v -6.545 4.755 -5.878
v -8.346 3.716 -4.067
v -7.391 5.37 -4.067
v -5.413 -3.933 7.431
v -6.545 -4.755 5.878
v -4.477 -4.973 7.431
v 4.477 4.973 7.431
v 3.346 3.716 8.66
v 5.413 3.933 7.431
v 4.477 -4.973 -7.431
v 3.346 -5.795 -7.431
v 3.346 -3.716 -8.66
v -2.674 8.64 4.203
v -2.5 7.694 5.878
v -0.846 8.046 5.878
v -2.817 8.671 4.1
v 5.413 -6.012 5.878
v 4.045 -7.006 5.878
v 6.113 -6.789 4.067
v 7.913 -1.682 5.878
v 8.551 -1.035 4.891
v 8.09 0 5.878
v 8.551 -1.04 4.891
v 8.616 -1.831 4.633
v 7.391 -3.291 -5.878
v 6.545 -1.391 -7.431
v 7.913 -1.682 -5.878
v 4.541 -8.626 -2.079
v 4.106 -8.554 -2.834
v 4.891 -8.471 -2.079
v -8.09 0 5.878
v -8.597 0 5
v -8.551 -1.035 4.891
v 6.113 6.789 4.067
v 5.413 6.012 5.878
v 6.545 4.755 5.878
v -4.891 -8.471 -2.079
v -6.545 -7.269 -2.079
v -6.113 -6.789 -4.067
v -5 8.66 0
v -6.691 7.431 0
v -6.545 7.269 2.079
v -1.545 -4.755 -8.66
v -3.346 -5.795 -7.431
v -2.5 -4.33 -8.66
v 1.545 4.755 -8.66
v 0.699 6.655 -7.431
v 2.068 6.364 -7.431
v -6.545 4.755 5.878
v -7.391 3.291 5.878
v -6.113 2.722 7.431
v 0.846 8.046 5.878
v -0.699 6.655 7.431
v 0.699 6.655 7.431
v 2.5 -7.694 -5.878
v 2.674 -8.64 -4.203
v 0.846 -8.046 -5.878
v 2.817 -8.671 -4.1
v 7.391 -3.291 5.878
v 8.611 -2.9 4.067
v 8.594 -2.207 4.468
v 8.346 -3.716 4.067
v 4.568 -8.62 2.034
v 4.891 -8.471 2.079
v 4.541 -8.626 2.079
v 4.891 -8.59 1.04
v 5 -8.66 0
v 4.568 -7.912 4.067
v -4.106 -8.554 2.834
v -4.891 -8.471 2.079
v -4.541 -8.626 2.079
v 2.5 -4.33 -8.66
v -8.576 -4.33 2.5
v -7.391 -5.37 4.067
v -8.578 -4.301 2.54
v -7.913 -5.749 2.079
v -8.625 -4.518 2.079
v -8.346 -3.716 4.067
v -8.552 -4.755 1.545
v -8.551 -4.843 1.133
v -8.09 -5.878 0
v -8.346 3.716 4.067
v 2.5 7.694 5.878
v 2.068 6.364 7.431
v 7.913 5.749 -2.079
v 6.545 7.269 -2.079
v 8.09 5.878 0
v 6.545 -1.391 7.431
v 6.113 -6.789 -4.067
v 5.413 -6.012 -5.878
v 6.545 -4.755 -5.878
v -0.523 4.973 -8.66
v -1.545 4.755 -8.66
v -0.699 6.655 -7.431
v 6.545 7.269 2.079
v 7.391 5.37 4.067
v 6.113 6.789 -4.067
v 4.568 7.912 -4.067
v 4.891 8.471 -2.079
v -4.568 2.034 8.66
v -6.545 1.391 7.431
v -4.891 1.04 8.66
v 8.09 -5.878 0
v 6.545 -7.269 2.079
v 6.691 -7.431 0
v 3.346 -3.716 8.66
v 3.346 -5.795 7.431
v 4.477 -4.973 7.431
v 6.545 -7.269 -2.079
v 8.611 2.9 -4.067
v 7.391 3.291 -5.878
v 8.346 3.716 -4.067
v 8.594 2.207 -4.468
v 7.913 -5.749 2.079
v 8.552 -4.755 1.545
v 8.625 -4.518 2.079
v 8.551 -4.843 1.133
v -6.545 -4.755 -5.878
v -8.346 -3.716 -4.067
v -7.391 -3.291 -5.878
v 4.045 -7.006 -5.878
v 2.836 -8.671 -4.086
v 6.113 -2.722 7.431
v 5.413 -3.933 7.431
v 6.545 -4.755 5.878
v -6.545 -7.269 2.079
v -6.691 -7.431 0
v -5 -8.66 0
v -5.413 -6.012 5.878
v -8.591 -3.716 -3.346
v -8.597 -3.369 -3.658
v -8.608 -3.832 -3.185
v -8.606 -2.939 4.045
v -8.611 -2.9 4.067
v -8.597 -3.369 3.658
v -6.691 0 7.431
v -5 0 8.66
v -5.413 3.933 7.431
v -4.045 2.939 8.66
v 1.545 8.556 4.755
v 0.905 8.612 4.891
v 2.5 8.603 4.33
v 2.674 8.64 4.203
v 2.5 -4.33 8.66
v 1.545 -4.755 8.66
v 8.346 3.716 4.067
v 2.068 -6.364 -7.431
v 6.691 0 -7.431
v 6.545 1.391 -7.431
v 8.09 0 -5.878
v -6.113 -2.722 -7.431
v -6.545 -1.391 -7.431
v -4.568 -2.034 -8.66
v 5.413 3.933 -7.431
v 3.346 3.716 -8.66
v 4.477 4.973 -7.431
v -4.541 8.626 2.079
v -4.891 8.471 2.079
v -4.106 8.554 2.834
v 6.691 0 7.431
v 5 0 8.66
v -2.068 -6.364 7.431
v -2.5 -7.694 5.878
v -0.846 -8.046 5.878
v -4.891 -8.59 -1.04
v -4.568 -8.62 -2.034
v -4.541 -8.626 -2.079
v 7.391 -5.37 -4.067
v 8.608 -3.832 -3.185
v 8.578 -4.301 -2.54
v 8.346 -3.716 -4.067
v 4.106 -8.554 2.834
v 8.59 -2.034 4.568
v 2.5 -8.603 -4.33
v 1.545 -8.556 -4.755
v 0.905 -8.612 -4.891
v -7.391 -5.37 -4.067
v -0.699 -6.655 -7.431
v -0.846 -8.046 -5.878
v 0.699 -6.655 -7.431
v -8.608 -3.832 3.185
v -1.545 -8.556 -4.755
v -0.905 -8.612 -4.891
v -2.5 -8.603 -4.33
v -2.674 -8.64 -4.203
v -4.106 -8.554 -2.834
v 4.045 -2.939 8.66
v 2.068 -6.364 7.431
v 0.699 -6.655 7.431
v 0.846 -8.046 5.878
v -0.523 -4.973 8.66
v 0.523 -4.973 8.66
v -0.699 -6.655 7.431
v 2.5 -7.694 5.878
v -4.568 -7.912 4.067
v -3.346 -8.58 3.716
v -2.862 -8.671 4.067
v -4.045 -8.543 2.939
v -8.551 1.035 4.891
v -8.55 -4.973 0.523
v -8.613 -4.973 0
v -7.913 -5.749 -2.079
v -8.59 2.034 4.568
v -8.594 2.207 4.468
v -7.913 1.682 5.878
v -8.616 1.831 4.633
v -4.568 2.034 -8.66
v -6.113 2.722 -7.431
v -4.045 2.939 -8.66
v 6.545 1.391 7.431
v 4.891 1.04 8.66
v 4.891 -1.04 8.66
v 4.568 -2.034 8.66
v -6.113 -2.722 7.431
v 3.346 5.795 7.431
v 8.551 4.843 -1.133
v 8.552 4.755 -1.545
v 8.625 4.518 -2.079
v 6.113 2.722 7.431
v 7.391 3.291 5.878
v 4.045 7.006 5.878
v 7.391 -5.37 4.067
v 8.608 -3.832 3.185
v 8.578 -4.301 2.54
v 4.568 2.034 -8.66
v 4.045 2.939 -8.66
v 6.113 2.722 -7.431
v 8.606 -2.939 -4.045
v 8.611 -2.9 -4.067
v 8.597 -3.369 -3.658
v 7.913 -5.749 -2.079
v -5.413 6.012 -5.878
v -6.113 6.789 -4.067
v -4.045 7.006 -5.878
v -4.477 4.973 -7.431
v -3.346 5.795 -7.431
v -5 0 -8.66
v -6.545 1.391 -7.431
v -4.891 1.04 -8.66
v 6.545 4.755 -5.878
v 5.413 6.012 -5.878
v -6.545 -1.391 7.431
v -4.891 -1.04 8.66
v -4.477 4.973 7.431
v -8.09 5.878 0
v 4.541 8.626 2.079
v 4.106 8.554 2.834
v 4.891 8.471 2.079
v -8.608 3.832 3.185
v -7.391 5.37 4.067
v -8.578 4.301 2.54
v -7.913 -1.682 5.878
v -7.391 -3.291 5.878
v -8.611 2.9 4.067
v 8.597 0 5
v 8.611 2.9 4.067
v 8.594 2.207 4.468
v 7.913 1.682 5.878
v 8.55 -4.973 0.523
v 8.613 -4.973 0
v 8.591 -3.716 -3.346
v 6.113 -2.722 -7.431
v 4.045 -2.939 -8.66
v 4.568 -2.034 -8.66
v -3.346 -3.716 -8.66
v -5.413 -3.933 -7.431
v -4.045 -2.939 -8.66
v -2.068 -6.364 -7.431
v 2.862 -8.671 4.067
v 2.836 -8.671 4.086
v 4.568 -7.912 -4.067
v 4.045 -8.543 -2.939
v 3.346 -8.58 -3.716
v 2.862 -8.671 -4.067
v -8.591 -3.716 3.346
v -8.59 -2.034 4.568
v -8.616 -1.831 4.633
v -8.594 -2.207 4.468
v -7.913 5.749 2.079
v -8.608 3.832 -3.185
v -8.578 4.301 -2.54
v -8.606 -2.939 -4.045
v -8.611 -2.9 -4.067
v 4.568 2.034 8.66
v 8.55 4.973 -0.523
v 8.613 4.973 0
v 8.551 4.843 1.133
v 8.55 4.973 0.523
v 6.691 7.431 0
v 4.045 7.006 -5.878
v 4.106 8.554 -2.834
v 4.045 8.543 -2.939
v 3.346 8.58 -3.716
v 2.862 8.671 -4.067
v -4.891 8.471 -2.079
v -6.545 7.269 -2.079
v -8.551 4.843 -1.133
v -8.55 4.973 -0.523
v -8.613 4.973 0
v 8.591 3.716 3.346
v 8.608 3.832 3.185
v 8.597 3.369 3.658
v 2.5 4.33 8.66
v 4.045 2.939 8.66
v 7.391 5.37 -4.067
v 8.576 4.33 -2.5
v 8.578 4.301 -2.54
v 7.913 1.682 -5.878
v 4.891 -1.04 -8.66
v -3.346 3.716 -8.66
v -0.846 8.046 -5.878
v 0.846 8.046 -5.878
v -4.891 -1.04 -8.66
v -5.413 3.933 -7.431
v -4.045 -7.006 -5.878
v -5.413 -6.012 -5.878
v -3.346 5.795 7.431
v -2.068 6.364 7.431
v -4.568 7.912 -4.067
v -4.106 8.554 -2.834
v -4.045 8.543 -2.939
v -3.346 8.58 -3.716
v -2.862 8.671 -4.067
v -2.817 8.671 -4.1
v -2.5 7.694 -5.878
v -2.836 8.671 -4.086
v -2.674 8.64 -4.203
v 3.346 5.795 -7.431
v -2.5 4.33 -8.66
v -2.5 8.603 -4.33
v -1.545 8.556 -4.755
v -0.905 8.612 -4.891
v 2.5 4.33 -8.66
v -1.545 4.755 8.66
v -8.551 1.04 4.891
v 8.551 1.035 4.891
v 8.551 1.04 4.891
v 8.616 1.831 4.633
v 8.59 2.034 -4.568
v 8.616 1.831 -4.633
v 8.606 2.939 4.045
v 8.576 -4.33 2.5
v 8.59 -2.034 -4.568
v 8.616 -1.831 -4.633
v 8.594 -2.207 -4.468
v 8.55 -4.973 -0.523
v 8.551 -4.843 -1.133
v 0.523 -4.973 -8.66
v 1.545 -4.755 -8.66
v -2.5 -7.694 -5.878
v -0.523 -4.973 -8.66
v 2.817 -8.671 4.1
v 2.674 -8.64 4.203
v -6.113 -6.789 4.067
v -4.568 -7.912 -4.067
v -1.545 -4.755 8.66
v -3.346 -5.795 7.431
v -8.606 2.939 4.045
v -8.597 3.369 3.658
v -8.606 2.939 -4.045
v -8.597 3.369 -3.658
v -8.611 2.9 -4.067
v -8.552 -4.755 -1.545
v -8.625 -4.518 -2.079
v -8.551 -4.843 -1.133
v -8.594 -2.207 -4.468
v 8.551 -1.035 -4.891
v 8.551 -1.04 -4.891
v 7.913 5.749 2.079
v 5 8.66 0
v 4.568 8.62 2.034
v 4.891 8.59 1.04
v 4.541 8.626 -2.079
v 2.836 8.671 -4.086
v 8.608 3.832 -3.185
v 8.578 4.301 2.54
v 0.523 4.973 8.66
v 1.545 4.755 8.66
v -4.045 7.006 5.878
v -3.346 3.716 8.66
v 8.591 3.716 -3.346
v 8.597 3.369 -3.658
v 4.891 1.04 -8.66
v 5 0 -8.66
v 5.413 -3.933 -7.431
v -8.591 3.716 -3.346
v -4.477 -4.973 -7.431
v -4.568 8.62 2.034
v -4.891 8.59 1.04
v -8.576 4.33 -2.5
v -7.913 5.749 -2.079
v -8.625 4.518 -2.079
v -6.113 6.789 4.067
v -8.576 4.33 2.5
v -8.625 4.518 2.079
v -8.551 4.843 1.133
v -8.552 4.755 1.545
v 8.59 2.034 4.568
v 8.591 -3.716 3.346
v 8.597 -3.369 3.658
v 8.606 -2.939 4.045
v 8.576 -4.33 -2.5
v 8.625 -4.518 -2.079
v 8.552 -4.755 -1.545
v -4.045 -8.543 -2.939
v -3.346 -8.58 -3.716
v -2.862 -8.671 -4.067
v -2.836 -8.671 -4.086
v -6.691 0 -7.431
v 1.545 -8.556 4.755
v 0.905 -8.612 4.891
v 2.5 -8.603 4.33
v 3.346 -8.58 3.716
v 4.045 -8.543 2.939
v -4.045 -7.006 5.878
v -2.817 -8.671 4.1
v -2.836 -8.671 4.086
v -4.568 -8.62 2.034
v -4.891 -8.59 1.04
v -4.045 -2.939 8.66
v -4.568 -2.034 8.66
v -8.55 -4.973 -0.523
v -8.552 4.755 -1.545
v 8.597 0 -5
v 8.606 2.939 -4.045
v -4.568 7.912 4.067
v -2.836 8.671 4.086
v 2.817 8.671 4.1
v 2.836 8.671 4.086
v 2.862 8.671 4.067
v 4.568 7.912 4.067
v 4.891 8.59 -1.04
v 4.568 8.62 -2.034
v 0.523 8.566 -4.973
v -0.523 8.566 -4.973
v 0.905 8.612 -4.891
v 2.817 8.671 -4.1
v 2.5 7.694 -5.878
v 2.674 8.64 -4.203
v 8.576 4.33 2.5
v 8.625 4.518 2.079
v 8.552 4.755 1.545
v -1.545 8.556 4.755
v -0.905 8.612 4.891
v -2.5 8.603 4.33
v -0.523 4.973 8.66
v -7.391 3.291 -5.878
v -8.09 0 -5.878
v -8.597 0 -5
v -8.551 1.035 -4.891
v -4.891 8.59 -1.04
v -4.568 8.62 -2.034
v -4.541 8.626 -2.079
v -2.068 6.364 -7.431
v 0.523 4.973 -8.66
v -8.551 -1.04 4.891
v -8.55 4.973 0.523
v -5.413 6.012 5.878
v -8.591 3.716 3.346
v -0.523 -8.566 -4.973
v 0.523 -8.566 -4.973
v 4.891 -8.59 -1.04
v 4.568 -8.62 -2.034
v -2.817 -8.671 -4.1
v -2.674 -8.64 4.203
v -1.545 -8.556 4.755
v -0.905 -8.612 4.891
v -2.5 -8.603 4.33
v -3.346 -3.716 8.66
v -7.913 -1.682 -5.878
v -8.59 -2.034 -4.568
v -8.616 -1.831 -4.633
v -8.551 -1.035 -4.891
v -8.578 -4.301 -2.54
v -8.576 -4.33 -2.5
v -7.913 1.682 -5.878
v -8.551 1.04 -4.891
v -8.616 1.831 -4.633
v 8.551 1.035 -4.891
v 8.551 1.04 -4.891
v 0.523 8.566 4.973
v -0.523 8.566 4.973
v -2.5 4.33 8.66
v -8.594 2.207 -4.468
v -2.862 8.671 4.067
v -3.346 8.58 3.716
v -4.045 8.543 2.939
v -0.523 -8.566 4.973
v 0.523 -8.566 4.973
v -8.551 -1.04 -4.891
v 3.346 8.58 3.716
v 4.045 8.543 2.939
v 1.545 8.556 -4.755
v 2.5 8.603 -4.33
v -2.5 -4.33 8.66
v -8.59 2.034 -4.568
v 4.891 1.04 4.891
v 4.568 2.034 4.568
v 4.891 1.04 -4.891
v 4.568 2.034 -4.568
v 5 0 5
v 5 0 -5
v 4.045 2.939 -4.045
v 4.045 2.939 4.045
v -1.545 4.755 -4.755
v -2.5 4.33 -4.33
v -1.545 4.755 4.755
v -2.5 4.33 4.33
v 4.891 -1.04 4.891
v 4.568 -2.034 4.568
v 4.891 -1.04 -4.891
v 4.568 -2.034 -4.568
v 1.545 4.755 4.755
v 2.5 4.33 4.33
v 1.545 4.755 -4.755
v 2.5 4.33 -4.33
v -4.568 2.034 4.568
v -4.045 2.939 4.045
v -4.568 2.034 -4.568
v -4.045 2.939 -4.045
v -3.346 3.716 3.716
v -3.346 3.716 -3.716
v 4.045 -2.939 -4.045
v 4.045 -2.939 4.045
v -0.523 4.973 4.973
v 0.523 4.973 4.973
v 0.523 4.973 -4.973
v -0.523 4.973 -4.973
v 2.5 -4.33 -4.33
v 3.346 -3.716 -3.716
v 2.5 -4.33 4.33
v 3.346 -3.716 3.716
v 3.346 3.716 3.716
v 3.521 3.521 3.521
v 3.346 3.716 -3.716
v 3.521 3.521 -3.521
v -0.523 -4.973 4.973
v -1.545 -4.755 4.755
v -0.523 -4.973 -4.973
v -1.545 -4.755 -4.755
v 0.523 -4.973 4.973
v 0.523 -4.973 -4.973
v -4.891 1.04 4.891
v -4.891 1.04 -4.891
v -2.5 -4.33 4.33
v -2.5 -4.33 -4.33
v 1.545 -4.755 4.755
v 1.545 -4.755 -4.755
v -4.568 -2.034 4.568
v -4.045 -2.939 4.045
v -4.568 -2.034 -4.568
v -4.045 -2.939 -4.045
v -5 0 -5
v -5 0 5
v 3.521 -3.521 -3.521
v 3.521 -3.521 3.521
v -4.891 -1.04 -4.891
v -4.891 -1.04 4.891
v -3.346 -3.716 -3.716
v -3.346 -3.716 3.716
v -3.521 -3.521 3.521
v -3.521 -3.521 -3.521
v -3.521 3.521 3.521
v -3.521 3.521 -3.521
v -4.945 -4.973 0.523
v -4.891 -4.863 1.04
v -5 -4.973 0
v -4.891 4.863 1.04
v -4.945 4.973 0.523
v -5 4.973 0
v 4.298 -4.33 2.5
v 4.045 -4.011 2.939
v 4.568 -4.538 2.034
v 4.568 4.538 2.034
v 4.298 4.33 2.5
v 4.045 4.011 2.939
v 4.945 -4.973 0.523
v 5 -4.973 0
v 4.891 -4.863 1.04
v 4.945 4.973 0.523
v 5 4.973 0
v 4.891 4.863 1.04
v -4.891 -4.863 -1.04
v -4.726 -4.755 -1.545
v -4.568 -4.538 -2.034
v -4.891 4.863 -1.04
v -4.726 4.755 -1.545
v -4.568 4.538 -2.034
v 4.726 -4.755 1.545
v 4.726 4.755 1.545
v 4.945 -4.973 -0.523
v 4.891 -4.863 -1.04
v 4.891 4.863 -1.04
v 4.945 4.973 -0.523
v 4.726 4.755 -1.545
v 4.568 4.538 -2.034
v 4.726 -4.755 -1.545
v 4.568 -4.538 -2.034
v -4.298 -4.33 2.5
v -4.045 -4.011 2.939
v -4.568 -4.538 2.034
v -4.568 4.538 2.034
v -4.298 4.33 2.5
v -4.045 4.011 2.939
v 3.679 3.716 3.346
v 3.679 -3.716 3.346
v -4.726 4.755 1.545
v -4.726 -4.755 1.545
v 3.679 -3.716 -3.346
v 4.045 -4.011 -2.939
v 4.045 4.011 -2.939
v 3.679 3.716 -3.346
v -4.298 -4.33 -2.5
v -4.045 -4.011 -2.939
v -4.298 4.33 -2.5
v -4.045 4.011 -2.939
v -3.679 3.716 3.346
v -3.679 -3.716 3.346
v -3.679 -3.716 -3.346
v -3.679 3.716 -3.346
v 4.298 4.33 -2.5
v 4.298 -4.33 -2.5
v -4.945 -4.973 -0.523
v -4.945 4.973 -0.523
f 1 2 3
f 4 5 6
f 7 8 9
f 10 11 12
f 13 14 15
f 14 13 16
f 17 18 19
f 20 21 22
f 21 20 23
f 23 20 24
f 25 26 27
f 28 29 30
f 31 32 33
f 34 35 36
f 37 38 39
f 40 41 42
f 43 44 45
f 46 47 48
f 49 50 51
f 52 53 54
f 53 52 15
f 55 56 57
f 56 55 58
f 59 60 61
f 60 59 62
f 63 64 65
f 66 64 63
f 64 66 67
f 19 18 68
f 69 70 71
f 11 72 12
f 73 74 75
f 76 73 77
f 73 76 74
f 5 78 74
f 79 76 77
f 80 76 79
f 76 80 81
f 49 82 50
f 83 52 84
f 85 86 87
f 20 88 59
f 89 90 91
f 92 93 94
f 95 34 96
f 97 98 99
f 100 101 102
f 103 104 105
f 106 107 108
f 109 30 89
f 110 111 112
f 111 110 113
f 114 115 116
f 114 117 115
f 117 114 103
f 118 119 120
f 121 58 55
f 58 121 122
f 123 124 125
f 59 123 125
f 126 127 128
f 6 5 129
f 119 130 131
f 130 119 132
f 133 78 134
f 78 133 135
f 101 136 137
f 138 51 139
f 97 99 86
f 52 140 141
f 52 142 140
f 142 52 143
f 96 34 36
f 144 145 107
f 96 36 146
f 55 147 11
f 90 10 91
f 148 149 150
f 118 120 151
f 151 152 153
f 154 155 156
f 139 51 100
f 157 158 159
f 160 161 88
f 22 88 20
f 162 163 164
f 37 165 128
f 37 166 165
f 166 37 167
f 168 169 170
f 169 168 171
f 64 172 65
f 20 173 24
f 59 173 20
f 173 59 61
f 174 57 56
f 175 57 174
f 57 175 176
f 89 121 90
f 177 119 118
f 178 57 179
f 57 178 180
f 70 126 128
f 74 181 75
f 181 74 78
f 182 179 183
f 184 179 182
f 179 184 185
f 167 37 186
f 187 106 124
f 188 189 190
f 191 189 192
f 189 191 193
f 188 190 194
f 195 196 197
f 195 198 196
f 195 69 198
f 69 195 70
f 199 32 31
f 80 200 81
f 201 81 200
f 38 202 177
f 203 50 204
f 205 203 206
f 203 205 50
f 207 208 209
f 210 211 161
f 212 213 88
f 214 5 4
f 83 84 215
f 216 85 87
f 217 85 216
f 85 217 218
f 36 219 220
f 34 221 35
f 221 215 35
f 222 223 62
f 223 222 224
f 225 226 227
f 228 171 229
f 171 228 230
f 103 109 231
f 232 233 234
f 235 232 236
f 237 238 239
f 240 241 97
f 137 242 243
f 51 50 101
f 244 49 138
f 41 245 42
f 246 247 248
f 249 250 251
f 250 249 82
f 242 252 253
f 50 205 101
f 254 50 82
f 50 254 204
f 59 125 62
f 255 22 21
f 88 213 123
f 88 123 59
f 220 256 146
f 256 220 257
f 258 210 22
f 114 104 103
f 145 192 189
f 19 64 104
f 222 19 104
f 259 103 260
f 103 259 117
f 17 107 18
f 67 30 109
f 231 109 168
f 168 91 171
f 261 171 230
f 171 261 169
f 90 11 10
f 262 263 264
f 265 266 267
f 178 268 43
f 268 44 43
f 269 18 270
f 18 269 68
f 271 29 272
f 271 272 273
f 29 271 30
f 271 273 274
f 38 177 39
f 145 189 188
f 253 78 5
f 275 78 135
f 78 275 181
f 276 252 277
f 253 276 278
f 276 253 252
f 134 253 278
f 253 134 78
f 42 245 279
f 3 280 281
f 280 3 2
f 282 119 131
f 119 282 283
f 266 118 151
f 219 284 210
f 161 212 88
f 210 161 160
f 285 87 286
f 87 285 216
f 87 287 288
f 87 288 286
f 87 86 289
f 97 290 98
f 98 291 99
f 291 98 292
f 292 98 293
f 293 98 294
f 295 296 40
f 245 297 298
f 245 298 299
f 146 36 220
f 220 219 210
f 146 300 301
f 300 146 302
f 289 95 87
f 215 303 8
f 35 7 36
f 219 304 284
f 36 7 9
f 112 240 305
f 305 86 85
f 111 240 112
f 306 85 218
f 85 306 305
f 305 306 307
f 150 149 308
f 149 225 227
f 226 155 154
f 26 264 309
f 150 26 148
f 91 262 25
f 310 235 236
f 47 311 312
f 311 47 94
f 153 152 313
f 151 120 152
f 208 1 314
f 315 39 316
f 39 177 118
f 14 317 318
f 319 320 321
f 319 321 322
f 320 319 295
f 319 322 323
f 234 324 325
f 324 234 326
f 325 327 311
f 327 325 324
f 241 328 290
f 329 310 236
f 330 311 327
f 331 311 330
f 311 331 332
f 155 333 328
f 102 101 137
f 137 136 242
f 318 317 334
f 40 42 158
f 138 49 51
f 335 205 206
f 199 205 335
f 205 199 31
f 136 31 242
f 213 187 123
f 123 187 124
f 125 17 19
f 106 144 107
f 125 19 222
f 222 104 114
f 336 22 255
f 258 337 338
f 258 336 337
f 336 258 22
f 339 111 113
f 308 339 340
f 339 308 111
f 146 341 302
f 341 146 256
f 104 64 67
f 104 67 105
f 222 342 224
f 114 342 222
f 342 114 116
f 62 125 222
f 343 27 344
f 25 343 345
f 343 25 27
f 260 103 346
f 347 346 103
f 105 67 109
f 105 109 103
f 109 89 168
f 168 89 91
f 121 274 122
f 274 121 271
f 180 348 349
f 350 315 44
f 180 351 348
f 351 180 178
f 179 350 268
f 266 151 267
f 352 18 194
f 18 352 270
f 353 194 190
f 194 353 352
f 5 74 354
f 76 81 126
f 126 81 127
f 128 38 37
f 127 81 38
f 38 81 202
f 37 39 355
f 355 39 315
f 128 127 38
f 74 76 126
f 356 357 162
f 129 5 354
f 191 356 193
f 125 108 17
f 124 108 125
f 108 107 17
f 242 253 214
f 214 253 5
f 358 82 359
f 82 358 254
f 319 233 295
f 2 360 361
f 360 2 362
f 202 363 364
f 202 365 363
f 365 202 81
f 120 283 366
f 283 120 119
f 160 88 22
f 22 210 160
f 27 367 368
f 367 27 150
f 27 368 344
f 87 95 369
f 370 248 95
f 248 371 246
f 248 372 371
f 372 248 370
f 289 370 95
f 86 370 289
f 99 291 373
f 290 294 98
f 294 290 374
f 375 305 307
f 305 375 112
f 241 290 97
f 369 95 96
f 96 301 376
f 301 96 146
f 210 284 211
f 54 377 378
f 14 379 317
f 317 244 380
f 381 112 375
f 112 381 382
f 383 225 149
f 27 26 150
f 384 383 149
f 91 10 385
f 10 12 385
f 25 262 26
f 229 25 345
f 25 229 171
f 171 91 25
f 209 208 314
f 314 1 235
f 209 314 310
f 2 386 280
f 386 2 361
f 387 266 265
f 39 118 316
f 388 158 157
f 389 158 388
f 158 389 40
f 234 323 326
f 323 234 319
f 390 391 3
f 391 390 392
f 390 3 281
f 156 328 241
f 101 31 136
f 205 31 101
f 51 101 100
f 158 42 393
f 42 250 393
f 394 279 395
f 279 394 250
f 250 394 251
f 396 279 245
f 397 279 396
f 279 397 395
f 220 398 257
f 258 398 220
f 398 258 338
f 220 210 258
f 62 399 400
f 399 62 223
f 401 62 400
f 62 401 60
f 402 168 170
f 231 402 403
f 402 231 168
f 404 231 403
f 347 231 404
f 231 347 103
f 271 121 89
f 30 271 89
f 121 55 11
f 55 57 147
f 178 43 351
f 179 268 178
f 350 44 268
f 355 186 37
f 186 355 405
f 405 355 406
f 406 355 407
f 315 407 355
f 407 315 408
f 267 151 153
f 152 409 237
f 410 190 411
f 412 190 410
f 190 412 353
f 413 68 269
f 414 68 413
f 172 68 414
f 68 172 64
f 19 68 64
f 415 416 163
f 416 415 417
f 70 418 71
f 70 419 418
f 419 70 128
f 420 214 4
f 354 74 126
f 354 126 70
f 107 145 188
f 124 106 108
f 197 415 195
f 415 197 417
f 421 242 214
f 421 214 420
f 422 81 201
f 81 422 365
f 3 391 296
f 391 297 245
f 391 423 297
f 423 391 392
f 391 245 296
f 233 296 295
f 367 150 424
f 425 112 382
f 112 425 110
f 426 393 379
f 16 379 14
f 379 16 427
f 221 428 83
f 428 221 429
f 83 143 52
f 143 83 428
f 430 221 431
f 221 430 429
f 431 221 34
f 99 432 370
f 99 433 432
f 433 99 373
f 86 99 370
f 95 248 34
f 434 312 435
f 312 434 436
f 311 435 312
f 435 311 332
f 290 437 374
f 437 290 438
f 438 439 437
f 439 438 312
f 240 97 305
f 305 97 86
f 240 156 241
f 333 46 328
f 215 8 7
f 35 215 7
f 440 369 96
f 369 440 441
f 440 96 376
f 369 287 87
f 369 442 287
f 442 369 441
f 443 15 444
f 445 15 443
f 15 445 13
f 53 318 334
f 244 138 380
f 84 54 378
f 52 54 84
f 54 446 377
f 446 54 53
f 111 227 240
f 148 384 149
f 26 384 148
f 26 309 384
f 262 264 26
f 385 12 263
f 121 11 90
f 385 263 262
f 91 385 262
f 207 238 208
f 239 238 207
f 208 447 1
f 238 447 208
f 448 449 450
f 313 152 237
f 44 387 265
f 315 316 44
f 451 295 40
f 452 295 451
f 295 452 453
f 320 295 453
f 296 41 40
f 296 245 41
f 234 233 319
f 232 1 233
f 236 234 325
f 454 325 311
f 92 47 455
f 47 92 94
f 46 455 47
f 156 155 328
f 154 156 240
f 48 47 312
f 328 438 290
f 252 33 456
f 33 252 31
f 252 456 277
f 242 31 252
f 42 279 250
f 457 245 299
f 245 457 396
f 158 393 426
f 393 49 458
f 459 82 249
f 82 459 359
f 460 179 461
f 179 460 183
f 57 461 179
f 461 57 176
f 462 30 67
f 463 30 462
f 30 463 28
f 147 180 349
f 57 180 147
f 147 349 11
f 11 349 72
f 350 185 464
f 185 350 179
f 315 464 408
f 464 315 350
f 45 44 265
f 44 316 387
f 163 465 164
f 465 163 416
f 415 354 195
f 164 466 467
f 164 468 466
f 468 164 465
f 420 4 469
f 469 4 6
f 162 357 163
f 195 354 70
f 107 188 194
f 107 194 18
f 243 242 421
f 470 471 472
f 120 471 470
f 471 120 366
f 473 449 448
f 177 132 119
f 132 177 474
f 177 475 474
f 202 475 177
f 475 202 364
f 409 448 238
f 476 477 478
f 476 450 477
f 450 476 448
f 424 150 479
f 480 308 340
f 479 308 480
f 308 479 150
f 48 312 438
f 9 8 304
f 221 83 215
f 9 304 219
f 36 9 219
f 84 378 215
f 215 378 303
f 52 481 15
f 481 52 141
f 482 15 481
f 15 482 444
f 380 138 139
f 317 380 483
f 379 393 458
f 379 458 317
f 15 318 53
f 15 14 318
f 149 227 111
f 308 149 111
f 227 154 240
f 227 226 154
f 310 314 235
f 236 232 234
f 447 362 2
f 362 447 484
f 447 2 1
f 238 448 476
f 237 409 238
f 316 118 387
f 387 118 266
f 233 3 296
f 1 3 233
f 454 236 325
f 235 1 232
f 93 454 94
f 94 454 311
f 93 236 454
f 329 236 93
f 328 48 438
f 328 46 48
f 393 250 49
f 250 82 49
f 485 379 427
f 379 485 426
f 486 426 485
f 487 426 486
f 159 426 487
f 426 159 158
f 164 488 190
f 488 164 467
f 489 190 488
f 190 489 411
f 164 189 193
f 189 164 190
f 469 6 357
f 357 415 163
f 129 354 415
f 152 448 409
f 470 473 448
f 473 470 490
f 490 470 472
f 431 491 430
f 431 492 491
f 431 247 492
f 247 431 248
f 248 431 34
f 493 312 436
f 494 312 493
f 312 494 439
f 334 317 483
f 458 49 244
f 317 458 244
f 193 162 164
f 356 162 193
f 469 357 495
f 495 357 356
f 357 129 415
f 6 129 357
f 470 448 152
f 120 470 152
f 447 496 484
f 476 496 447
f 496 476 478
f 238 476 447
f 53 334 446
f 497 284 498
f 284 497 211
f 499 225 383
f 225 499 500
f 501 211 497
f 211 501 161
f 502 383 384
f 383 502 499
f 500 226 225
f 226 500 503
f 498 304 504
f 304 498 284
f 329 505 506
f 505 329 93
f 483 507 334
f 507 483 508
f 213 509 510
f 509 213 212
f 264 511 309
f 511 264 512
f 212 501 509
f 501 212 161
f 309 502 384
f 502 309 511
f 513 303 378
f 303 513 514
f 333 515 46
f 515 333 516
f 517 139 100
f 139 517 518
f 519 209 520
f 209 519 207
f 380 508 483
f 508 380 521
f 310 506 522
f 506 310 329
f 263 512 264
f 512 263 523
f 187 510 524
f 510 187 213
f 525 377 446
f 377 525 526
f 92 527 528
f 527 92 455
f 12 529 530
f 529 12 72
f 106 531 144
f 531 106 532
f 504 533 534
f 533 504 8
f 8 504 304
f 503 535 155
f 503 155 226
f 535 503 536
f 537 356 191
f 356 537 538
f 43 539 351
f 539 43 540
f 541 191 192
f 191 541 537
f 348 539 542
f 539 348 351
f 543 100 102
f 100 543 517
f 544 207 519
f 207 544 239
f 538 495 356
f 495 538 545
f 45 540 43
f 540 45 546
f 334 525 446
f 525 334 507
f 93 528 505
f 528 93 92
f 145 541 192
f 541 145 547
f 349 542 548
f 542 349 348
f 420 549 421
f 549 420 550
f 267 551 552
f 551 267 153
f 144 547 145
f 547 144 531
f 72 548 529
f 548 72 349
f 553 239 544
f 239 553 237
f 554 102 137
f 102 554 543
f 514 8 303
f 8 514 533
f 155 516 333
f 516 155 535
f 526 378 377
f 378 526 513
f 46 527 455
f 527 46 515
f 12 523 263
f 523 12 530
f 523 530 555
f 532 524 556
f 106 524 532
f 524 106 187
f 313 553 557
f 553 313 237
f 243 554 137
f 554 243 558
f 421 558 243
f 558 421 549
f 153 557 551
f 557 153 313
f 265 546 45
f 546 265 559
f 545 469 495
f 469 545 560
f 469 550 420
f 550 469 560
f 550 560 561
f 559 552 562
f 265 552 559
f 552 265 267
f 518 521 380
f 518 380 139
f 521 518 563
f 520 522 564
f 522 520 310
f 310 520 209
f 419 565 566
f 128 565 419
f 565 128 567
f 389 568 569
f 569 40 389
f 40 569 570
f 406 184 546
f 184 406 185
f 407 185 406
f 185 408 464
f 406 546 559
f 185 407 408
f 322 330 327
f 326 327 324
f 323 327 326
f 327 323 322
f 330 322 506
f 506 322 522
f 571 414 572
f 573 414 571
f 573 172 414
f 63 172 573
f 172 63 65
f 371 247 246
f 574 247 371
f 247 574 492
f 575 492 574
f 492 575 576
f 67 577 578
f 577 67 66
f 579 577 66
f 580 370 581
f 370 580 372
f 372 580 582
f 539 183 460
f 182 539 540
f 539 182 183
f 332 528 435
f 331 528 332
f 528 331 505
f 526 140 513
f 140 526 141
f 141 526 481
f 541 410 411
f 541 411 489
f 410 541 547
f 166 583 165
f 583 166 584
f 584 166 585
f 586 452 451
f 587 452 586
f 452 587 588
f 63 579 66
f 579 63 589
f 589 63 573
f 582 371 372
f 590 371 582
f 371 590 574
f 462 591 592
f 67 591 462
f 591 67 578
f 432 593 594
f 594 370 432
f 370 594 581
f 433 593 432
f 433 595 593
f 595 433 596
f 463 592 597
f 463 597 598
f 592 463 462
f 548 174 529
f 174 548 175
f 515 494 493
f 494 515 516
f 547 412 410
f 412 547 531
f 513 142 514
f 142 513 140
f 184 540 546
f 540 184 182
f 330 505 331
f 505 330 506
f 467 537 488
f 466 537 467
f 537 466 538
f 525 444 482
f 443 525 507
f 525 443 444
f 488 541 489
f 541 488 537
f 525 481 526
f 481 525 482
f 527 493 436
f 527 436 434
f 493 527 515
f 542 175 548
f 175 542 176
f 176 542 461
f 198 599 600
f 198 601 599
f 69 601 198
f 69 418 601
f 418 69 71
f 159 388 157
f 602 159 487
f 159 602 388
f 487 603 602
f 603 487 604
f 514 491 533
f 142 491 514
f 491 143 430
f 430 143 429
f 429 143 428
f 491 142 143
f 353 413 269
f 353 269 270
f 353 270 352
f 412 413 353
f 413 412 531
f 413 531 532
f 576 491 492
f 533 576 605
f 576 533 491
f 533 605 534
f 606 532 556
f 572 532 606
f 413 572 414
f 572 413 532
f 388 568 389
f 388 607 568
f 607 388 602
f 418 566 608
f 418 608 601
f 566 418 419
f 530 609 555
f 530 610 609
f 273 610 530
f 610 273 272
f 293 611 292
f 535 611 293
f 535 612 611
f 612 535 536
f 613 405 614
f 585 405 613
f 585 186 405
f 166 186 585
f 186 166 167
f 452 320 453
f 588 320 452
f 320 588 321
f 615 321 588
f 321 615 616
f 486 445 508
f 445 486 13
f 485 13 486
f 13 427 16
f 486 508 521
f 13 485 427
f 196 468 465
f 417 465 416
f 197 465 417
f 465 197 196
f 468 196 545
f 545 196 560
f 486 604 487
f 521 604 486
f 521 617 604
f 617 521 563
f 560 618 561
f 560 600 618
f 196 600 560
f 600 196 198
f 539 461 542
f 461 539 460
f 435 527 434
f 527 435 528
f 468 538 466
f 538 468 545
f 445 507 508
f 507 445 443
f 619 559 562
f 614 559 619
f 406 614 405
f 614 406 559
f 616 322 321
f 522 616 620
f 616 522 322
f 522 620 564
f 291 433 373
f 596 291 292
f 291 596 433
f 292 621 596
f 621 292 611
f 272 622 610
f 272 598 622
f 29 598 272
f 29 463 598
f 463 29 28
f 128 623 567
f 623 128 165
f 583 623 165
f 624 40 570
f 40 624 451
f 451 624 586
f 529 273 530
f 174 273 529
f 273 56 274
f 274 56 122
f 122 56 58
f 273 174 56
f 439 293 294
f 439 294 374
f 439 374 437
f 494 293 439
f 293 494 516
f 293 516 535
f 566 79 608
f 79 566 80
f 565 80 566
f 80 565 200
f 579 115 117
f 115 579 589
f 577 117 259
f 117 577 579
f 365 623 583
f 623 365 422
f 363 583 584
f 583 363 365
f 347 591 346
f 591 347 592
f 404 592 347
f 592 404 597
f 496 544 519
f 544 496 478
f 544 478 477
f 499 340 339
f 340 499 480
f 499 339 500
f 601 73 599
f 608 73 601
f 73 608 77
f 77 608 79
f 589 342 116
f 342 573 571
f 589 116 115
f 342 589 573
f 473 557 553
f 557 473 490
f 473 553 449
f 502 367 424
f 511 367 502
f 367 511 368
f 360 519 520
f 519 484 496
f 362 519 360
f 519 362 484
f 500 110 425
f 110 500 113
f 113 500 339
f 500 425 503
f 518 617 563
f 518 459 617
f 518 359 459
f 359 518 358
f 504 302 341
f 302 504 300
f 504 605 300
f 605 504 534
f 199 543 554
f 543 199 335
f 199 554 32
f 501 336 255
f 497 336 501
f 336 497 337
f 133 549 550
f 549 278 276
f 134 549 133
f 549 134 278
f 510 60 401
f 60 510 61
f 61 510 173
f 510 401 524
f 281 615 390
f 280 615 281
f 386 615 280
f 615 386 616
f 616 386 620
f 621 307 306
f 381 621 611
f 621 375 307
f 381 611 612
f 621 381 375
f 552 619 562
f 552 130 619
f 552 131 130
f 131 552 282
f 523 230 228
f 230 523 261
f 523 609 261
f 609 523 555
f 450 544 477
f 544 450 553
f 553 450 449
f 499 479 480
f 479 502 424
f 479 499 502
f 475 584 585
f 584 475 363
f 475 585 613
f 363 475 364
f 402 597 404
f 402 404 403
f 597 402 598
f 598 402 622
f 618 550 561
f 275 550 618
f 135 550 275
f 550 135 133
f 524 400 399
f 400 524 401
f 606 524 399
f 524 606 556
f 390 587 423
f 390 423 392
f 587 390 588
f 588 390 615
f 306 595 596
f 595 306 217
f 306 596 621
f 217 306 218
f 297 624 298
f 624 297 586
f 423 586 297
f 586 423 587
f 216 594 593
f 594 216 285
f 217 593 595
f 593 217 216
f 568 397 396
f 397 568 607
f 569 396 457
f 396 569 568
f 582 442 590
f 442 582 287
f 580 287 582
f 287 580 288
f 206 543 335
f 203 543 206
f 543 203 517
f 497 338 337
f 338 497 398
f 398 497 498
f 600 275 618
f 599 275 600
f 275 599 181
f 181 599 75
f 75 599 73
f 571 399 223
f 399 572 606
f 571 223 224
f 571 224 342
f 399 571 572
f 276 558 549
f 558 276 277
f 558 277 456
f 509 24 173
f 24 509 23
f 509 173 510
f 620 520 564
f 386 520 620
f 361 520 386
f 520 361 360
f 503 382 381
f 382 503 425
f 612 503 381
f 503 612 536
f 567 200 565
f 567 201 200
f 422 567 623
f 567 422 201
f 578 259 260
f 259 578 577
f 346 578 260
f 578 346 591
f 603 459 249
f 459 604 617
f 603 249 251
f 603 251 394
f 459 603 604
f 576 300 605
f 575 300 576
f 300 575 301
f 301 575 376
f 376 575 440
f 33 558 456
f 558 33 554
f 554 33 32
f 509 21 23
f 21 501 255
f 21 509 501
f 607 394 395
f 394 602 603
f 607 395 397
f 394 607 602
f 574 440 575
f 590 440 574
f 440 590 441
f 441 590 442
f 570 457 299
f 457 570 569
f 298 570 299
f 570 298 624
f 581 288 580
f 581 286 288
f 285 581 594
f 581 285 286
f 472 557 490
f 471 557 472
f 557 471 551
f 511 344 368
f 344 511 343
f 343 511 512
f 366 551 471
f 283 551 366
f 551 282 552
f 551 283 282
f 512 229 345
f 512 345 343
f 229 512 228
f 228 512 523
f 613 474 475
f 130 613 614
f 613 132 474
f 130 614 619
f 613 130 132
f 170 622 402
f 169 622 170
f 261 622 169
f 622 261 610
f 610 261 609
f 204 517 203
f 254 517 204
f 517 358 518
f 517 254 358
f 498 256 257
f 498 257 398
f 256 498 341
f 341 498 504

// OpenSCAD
difference() {
    sphere(10);
    $fn=30;
    translate([0, 0, -11]) cylinder(22, 5, 5);
    #rotate([90, 0, 0]) translate([0, 0, -11]) cylinder(22, 5, 5);
    rotate([0, 90, 0]) translate([0, 0, -11]) cylinder(22, 5, 5);
}
